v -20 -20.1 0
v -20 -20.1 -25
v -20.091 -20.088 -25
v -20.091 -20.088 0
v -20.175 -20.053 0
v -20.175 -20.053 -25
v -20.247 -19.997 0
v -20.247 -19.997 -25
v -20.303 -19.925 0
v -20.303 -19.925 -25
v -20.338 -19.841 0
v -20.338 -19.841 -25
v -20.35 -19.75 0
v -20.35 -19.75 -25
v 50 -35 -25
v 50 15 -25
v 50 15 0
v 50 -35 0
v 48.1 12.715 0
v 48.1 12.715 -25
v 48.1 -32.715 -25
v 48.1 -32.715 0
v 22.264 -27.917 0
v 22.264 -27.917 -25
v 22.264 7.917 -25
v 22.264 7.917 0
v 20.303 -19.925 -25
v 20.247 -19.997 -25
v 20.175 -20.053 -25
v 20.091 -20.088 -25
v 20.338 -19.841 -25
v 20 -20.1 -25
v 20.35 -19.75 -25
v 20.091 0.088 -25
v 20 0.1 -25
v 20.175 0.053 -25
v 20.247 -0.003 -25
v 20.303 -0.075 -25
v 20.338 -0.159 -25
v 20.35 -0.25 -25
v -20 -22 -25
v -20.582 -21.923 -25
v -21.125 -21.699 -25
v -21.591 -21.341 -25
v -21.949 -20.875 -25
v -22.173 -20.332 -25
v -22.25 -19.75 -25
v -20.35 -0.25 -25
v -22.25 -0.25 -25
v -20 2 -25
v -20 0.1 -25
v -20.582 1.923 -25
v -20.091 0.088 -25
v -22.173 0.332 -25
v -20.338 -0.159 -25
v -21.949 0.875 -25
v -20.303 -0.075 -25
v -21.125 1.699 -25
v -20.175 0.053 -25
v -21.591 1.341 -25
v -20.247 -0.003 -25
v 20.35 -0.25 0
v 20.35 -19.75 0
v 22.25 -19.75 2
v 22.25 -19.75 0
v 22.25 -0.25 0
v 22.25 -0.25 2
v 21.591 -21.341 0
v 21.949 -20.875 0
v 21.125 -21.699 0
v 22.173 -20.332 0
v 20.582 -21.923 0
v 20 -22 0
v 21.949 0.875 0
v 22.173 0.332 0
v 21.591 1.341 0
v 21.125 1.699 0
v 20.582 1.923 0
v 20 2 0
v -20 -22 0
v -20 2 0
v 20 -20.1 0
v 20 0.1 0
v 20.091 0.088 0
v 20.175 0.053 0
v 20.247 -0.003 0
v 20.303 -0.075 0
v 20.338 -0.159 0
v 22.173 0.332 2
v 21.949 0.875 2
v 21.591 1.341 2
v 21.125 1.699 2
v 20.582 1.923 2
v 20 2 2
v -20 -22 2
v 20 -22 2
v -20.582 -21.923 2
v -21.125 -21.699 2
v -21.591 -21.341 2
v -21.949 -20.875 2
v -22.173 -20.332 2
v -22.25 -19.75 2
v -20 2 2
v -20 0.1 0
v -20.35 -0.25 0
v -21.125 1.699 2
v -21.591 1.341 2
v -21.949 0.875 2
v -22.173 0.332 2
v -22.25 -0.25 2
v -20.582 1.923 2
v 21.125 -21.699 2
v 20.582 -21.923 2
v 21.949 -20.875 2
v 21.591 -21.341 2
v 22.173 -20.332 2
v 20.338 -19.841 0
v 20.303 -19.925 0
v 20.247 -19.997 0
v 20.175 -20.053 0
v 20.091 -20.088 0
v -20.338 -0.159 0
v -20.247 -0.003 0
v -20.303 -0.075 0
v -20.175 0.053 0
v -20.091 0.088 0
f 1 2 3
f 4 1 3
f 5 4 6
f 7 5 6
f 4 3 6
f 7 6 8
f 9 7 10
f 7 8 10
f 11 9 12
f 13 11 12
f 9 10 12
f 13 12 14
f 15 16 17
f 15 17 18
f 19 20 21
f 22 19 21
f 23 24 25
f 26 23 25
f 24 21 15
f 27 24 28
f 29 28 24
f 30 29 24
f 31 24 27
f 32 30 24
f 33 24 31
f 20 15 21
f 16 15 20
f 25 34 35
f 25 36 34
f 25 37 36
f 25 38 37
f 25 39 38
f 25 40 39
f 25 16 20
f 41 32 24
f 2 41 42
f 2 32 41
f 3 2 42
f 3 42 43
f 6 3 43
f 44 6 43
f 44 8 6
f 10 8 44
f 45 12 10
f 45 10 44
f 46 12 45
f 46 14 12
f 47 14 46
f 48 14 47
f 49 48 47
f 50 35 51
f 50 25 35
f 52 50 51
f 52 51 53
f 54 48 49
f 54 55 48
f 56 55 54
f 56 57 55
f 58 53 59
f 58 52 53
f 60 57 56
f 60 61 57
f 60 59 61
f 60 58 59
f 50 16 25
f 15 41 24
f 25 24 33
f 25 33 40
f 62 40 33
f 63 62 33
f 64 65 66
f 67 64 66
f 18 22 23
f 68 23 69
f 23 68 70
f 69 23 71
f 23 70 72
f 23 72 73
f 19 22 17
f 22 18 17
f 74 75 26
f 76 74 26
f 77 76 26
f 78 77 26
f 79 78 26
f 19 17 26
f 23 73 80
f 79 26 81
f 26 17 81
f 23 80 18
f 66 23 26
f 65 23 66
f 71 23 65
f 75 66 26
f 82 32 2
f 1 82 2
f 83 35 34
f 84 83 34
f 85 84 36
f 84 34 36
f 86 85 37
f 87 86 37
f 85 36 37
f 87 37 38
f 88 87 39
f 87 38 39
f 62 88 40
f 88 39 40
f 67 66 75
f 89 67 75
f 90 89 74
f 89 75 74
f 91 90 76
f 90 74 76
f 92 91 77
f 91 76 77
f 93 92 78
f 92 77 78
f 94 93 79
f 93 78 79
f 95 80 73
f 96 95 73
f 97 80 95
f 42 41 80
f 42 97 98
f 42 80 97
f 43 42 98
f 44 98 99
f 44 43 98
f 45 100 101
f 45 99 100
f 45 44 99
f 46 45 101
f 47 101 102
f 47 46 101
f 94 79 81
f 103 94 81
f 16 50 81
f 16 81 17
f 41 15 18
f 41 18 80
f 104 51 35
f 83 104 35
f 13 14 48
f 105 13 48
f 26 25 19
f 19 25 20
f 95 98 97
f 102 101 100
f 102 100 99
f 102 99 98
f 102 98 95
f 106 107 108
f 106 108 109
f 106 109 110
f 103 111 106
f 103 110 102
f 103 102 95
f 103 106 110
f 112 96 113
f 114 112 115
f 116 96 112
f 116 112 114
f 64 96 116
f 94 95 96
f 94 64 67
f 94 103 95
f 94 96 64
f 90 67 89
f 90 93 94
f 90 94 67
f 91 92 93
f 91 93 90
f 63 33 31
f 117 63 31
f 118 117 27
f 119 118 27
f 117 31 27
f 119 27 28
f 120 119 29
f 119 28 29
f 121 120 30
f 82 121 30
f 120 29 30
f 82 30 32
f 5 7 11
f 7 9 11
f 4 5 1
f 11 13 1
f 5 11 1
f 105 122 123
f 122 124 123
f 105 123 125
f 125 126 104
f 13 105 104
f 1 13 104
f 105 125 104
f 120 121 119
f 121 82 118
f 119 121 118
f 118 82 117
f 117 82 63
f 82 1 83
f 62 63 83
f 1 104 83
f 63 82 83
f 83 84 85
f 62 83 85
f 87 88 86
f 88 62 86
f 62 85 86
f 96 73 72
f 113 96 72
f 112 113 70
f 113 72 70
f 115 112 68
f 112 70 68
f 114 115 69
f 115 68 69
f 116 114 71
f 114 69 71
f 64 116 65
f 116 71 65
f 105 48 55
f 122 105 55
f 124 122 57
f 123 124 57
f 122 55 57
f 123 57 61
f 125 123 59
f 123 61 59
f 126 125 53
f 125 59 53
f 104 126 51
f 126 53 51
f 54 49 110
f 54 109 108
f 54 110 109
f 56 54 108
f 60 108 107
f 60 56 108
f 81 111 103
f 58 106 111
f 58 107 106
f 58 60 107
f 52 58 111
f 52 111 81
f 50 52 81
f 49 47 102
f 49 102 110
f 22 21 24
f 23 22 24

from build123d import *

# Parameters (mm, degrees)
BOSS_EXTRU_1_DEPTH      = 2
BOSS_EXTRU_3_START      = 25
BOSS_EXTRU_3_DEPTH      = 25
ENL_V_MAT_EXTRU_1_DEPTH = 50


with BuildPart() as part:
    # Esquisse1 → Boss.-Extru.1 (new body)
    with BuildSketch(Plane.XY):
        with BuildLine():
            Line((20, 2), (-20, 2))
            ThreePointArc((-20, 2), (-21.590990258, 1.340990258), (-22.25, -0.25))
            Line((-22.25, -0.25), (-22.25, -19.75))
            ThreePointArc((-22.25, -19.75), (-21.590990258, -21.340990258), (-20, -22))
            Line((-20, -22), (20, -22))
            ThreePointArc((20, -22), (21.590990258, -21.340990258), (22.25, -19.75))
            Line((22.25, -19.75), (22.25, -0.25))
            ThreePointArc((22.25, -0.25), (21.590990258, 1.340990258), (20, 2))
        make_face()
    extrude(amount=BOSS_EXTRU_1_DEPTH)

    # Esquisse2 → Boss.-Extru.3 (add)
    # profile 1 of 2: a face of its own
    with BuildSketch(Plane(origin=(0, 0, 0), x_dir=(-1, 0, 0), z_dir=(0, 0, -1)).offset(BOSS_EXTRU_3_START)):
        with BuildLine():
            Line((-22.25, -19.75), (-22.25, -0.25))
            ThreePointArc((-22.25, -0.25), (-21.590990258, 1.340990258), (-20, 2))
            Line((-20, 2), (20, 2))
            Line((20, 2), (-50, 15))
            Line((-50, 15), (-50, 2))
            Line((-50, 2), (-50, -22))
            Line((-50, -22), (-50, -35))
            Line((-50, -35), (20, -22))
            Line((20, -22), (-20, -22))
            ThreePointArc((-20, -22), (-21.590990258, -21.340990258), (-22.25, -19.75))
        make_face()
    # profile 2 of 2: a face of its own
    with BuildSketch(Plane(origin=(0, 0, 0), x_dir=(-1, 0, 0), z_dir=(0, 0, -1)).offset(BOSS_EXTRU_3_START)):
        with BuildLine():
            Line((20, 2), (-20, 2))
            ThreePointArc((-20, 2), (-21.590990258, 1.340990258), (-22.25, -0.25))
            Line((-22.25, -0.25), (-22.25, -19.75))
            ThreePointArc((-22.25, -19.75), (-21.590990258, -21.340990258), (-20, -22))
            Line((-20, -22), (20, -22))
            ThreePointArc((20, -22), (21.590990258, -21.340990258), (22.25, -19.75))
            Line((22.25, -19.75), (22.25, -0.25))
            ThreePointArc((22.25, -0.25), (21.590990258, 1.340990258), (20, 2))
        make_face()
        with BuildLine():
            ThreePointArc((20.35, -0.25), (20.247487373, -0.002512627), (20, 0.1))
            Line((20, 0.1), (-20, 0.1))
            ThreePointArc((-20, 0.1), (-20.247487373, -0.002512627), (-20.35, -0.25))
            Line((-20.35, -0.25), (-20.35, -19.75))
            ThreePointArc((-20.35, -19.75), (-20.247487373, -19.997487373), (-20, -20.1))
            Line((-20, -20.1), (20, -20.1))
            ThreePointArc((20, -20.1), (20.247487373, -19.997487373), (20.35, -19.75))
            Line((20.35, -19.75), (20.35, -0.25))
        make_face(mode=Mode.SUBTRACT)
    extrude(amount=-BOSS_EXTRU_3_DEPTH)

    # Esquisse5 → Enlèv. mat.-Extru.1 (cut)
    with BuildSketch(Plane(origin=(0, 0, -25), x_dir=(-1, 0, 0), z_dir=(0, 0, -1))):
        Polygon((-22.26420213, 7.916578551), (-48.1, 12.714655299), (-48.1, -32.714655299), (-22.26420213, -27.916578551), align=None)
    extrude(amount=-ENL_V_MAT_EXTRU_1_DEPTH, mode=Mode.SUBTRACT)


solid = part.part
